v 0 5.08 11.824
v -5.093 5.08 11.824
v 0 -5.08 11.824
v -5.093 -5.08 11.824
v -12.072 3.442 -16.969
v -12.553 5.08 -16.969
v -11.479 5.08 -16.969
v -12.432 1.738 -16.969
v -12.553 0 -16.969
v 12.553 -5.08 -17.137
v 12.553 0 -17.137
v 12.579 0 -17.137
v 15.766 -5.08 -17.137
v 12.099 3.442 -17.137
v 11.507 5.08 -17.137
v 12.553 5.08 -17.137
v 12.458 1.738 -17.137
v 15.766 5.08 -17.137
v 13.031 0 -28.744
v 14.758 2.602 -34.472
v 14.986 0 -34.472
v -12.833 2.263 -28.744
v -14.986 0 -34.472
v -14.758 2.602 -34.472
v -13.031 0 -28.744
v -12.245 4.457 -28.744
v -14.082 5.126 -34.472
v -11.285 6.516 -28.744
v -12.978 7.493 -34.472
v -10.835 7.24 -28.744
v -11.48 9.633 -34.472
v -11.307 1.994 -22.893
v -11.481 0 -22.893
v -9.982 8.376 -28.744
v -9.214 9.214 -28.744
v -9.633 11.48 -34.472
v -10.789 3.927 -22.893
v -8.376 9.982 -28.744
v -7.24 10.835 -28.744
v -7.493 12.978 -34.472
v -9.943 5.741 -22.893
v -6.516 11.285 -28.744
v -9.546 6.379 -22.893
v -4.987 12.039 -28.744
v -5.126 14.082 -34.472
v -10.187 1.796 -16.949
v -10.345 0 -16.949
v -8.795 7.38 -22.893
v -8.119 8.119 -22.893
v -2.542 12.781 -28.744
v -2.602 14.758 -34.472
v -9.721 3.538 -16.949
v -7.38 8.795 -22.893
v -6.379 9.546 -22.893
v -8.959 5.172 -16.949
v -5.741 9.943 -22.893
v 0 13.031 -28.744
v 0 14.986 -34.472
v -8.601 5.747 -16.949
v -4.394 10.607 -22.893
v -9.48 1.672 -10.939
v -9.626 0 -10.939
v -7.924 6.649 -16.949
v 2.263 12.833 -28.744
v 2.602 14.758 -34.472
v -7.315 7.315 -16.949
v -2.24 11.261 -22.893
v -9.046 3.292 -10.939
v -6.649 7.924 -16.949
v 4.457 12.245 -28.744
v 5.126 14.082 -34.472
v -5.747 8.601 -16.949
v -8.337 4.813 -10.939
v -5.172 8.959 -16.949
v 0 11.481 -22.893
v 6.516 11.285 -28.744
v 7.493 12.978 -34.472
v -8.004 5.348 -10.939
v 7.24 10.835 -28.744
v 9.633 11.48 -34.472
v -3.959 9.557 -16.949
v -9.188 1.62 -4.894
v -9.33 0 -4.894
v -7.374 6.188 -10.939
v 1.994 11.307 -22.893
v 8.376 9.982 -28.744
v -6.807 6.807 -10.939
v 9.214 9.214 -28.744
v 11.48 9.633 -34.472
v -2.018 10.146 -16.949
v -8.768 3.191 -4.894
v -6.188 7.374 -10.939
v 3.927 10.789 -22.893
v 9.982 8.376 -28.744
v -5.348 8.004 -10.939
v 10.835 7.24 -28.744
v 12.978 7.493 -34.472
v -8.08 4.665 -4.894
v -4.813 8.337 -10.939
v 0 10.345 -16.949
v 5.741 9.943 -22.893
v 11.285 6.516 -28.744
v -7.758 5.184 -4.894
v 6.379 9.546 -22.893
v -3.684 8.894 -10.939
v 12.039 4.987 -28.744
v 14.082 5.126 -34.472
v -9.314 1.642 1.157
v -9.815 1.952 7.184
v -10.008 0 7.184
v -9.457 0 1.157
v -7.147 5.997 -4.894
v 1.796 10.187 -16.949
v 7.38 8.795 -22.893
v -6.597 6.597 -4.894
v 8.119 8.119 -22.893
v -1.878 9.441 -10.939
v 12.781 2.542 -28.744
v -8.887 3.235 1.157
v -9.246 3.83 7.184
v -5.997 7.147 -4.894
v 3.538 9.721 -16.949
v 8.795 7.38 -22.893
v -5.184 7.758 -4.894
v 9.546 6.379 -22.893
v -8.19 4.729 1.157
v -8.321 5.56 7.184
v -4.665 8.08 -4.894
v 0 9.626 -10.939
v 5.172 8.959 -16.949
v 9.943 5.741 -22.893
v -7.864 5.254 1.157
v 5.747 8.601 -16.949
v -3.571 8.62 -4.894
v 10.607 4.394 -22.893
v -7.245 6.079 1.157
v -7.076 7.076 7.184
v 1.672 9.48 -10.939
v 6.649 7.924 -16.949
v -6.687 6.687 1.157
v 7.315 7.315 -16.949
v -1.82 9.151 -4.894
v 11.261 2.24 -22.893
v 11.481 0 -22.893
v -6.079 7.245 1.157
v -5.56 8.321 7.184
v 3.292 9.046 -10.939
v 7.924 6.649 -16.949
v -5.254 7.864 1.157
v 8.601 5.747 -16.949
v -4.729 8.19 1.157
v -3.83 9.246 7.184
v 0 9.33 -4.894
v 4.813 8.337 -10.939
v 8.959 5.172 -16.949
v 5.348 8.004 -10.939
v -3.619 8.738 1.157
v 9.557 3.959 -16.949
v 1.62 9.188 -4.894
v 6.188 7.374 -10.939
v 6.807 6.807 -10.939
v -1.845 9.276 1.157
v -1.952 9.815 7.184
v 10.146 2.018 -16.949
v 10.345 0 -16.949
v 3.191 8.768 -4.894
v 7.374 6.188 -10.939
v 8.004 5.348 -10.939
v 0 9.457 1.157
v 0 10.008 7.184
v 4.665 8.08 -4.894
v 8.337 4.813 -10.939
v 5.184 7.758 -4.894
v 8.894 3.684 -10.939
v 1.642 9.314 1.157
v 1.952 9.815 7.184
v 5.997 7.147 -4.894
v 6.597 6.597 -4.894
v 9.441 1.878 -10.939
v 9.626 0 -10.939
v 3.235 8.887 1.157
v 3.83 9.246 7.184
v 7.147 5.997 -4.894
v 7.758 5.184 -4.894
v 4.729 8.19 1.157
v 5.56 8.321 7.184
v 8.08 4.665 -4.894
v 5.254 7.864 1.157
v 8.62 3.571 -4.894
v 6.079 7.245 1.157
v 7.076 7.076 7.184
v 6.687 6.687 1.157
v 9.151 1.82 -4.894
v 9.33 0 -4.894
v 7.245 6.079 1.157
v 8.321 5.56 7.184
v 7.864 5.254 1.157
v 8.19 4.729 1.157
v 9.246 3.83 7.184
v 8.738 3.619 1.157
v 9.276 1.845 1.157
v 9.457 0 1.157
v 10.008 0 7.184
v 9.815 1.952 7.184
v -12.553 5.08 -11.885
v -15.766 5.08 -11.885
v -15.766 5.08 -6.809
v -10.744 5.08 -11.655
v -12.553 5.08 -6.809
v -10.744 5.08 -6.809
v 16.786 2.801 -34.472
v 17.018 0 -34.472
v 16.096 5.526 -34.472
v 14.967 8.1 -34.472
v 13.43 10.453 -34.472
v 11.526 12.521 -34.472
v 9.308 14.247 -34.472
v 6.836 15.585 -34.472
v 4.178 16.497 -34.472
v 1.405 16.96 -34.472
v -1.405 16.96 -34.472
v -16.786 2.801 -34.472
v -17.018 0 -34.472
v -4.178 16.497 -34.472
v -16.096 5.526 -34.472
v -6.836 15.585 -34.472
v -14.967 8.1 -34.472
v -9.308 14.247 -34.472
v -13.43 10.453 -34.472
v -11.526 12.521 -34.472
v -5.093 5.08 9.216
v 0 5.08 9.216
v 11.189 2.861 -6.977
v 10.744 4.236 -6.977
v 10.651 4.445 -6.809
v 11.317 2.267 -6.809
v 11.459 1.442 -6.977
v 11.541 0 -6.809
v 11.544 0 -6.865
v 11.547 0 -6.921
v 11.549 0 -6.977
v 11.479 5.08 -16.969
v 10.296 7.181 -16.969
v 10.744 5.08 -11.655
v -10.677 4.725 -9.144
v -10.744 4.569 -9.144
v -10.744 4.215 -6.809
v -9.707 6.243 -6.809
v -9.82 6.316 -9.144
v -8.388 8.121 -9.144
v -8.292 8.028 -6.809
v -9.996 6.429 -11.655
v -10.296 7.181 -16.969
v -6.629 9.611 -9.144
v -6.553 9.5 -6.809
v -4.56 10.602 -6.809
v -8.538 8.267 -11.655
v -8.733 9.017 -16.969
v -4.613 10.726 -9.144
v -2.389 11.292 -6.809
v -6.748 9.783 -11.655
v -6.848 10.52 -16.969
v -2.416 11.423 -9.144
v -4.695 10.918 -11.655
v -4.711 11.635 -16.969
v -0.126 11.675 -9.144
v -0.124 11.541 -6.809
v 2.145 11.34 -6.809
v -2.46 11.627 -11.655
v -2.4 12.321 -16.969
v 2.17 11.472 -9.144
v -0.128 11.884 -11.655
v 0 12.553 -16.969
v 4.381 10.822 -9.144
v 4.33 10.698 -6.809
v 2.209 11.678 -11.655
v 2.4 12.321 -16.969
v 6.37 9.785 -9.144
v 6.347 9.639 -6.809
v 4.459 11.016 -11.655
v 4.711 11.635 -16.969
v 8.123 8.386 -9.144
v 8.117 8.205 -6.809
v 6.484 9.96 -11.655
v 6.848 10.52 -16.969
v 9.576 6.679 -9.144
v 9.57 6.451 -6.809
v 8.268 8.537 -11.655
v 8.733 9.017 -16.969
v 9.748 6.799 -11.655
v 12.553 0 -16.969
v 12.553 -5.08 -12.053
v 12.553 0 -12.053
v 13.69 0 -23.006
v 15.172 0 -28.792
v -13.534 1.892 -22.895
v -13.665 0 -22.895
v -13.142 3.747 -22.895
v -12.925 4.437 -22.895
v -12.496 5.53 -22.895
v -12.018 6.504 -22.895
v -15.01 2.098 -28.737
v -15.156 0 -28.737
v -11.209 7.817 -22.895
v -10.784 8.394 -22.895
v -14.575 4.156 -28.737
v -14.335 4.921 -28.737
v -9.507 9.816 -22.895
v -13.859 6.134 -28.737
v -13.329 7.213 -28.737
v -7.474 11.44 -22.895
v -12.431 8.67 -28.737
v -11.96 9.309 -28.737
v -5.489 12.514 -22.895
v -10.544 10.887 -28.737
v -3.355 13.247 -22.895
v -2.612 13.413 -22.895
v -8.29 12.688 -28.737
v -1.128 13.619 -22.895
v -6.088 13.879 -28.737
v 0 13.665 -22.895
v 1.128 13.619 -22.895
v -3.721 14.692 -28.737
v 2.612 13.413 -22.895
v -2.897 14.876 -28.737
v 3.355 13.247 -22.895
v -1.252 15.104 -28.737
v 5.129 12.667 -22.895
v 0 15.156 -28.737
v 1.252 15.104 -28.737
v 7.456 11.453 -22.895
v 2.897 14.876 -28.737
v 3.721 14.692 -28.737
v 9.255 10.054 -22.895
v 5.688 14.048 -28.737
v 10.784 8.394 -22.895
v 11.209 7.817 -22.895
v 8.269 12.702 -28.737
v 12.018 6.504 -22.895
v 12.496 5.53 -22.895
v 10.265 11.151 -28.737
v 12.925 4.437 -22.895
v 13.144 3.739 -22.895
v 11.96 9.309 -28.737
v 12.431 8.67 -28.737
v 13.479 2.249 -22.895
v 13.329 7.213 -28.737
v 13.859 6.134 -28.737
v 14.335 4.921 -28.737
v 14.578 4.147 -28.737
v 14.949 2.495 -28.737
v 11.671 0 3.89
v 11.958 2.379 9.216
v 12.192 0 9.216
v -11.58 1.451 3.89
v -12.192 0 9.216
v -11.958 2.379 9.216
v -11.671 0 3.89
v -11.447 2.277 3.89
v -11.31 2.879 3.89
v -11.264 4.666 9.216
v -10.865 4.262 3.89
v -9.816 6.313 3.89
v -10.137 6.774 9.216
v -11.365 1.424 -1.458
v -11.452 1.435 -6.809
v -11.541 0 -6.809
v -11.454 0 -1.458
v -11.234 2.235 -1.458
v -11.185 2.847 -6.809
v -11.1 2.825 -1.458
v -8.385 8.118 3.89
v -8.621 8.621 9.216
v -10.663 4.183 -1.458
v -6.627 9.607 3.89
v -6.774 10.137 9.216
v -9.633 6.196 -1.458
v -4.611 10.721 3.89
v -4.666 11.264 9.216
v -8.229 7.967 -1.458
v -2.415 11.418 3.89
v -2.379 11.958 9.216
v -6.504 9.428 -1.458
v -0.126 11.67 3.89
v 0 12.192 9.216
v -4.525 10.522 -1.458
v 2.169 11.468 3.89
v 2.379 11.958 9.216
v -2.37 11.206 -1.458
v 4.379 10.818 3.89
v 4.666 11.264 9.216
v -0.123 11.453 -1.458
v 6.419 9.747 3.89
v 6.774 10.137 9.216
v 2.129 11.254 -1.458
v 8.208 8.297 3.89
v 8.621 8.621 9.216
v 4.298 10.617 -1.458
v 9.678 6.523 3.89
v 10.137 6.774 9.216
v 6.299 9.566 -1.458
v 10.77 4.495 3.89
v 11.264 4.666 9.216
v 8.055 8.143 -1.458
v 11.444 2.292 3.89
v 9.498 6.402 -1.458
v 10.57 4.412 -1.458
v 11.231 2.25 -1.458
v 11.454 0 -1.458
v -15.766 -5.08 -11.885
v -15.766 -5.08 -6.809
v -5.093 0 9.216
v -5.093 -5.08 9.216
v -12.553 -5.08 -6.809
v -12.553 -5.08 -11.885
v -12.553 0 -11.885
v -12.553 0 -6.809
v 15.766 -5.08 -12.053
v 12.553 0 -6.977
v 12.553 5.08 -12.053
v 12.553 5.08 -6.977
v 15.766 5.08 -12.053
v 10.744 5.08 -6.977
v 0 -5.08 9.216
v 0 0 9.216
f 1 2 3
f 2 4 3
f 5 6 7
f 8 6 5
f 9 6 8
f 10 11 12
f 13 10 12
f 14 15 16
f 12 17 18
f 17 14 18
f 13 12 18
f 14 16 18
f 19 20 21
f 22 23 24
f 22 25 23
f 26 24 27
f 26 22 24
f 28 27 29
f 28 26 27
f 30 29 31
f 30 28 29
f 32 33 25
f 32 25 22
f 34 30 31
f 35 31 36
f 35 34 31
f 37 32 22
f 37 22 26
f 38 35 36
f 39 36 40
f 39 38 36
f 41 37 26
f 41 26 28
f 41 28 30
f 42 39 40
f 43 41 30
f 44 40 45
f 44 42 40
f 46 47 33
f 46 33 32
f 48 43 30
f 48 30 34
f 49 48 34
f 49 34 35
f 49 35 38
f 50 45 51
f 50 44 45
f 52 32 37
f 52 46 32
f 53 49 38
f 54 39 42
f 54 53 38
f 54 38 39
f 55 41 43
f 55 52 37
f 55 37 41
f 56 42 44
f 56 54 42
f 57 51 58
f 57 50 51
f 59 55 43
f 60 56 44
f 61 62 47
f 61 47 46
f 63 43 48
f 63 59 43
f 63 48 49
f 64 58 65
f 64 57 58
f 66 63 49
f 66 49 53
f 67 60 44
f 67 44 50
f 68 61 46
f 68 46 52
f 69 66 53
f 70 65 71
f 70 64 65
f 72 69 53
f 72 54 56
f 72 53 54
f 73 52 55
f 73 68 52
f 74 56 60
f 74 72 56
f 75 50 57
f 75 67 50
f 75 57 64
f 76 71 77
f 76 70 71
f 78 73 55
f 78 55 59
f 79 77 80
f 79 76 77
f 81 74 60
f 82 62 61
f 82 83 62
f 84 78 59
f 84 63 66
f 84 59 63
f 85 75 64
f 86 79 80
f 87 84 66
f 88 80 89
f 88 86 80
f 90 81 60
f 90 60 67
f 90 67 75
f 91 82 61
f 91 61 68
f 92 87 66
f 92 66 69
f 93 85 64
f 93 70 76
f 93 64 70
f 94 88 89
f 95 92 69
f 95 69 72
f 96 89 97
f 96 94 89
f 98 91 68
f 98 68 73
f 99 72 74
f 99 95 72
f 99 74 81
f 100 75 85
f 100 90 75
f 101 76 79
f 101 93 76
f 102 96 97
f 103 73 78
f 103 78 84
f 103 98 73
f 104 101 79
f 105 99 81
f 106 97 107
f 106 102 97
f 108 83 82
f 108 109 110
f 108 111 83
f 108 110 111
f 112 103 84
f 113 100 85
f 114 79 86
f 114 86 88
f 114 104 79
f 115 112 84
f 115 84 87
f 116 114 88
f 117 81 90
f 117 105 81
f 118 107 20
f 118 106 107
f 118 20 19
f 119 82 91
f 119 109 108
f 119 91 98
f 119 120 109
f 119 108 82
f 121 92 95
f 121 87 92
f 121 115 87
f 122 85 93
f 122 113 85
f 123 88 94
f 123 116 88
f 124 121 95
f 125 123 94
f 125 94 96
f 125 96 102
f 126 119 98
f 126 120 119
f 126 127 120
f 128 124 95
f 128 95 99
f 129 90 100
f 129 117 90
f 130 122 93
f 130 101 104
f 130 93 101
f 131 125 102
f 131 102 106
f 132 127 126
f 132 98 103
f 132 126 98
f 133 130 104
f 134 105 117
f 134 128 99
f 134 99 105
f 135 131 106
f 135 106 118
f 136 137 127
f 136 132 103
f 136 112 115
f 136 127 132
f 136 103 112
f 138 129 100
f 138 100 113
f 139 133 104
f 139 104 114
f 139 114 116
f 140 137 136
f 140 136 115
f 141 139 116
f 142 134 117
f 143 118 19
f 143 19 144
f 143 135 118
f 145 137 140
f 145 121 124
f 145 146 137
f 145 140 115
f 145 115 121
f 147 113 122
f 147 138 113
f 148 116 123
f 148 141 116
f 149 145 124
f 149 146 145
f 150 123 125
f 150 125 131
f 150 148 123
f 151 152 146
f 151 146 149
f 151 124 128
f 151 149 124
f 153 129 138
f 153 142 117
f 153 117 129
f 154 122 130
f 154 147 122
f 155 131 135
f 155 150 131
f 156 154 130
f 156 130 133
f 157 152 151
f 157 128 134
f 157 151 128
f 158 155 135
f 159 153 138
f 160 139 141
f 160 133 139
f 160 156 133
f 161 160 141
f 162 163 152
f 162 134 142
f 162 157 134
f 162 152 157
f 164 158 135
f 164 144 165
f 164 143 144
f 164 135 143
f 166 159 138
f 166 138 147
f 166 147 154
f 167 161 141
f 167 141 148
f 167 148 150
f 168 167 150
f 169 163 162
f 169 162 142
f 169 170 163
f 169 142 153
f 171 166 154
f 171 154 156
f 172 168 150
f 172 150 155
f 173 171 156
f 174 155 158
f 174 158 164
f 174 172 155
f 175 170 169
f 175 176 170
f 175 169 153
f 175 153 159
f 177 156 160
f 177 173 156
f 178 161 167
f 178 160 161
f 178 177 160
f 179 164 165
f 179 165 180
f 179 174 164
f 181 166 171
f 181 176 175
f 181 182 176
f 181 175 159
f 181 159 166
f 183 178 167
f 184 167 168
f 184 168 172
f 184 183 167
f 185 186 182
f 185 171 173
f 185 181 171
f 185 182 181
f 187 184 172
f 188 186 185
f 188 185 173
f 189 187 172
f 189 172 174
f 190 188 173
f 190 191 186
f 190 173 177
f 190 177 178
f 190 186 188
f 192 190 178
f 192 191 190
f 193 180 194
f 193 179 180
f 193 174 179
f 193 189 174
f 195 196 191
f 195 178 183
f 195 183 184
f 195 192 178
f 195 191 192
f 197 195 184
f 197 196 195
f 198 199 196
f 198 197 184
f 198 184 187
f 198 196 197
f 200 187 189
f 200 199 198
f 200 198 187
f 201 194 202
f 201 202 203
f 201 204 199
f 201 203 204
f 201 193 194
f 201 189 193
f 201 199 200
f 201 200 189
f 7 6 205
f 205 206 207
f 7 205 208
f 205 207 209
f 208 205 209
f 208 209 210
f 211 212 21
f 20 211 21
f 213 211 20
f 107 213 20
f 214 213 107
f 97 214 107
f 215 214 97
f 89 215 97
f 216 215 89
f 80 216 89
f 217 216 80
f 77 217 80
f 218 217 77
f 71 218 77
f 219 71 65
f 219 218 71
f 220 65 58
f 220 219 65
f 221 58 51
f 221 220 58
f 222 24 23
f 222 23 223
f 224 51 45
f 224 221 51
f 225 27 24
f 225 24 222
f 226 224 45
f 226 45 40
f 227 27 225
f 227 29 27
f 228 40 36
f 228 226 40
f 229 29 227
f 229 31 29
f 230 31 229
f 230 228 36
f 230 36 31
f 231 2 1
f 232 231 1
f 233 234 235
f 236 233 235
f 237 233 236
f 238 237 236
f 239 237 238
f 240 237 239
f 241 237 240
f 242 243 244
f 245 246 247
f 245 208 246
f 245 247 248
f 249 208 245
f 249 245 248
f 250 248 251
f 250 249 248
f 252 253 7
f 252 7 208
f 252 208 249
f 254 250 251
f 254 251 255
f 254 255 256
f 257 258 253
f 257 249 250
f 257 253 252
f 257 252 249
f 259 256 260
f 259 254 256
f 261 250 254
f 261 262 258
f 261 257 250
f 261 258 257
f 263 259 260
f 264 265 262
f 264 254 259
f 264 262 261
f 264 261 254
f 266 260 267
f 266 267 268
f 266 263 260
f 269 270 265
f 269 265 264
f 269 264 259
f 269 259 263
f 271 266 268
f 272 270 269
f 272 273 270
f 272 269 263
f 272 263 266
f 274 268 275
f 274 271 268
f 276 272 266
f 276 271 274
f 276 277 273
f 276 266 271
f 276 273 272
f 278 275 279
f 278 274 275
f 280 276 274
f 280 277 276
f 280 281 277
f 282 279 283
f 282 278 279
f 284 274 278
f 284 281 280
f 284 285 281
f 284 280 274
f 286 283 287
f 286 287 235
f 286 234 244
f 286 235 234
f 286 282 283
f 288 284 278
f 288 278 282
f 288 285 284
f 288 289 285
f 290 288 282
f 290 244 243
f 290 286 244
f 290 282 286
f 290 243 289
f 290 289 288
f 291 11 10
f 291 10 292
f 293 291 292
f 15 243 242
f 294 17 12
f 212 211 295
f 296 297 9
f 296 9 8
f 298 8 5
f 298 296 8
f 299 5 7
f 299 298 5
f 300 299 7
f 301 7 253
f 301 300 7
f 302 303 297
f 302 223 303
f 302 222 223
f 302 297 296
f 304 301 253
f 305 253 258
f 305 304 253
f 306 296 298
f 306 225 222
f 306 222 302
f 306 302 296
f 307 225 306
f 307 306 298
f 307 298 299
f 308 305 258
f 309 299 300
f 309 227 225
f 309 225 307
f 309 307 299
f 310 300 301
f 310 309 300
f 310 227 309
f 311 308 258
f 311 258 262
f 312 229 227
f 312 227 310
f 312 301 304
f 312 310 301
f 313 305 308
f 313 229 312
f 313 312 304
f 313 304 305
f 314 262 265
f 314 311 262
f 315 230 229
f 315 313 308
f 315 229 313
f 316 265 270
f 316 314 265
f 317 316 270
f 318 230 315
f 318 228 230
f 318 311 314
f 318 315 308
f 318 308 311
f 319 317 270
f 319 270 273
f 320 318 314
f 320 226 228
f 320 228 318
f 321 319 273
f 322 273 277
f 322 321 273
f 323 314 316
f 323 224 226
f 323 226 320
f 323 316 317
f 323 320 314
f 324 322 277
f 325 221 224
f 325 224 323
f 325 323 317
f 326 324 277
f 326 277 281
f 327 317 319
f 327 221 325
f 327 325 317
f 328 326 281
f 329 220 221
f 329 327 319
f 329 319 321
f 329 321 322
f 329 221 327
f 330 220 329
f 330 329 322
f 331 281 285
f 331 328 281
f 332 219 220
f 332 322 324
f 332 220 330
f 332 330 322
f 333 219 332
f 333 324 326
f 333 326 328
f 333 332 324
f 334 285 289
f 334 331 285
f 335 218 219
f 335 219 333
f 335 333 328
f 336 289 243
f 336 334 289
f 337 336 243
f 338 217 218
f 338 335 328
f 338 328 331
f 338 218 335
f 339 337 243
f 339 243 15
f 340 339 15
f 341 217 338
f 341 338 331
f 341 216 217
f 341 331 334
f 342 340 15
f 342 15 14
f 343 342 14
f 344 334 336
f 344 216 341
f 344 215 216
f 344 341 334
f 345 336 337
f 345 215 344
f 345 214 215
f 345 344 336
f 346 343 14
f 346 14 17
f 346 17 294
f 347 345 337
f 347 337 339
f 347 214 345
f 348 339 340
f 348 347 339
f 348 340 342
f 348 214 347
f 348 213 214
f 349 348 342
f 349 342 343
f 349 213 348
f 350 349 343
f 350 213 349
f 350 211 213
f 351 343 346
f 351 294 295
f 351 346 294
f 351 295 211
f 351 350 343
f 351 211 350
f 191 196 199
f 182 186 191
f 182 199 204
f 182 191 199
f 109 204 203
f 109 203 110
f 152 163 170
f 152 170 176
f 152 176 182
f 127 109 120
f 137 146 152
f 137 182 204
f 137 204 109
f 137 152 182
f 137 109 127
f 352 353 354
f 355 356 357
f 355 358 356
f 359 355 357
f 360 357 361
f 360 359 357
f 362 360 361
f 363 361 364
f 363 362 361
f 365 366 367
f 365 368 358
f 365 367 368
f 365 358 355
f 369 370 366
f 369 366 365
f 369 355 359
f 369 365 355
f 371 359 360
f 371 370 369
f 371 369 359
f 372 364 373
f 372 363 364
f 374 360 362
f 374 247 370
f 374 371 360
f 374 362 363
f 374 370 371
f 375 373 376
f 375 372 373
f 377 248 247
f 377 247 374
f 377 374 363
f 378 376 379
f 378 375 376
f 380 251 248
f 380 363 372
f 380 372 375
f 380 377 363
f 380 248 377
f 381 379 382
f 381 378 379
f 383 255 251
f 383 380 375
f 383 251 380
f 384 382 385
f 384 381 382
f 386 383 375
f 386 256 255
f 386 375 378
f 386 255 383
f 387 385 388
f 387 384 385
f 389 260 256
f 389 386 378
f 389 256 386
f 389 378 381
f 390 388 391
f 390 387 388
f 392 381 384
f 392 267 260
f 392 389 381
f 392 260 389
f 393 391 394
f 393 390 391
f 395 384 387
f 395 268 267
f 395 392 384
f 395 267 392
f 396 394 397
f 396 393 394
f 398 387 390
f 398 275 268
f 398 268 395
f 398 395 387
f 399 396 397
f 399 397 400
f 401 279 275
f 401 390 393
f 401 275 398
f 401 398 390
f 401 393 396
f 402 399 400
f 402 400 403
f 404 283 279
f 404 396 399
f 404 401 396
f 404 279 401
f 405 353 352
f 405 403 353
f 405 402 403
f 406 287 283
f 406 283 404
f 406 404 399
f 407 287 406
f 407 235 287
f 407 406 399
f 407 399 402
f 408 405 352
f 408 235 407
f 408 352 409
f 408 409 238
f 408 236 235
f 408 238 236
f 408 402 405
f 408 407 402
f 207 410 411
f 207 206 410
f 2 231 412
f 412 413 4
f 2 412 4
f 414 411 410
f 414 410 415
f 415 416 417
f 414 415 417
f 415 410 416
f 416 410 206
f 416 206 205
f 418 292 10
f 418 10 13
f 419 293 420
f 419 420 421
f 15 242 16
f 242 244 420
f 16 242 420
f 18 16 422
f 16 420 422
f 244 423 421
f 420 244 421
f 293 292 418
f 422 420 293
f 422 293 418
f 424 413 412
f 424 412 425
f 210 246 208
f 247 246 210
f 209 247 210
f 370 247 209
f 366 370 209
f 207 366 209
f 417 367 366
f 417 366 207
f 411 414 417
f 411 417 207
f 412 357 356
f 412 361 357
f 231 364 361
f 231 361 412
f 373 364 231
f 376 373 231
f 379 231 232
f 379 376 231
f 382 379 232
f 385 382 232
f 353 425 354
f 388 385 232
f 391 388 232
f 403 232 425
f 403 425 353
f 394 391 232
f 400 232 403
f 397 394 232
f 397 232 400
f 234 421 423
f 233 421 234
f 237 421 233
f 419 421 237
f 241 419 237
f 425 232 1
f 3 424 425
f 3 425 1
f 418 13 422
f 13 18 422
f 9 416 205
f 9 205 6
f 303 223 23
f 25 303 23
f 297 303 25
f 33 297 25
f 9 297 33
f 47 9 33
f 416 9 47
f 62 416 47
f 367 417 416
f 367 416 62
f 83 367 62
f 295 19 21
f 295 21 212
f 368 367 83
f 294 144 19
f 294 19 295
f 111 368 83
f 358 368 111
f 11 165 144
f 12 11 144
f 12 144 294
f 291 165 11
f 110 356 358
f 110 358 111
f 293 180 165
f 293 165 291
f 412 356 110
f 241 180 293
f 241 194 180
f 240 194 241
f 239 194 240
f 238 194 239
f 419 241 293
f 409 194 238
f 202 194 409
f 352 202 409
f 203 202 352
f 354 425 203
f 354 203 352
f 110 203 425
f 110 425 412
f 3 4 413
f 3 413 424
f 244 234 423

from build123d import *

# Parameters (mm, degrees)
F1_ANGLE = 180
F2_DEPTH = 5.08
F0_W     = 3.2131851465
F0_H     = 5.0839147031
F0_H_2   = 5.0760852969
F0_W_2   = 5.092757754
F0_H_3   = 2.607280938
F3_DEPTH = 5.08


with BuildPart() as f1:
    # F0 (on Front) → F1 (revolve)
    with BuildSketch(Plane.XZ):
        with BuildLine():
            Line((0, 7.1843154948), (0, 9.2163154948))
            Line((0, 9.2163154948), (-5.092757754, 9.2163154948))
            Line((-5.092757754, 9.2163154948), (-12.192, 9.2163154948))
            ThreePointArc((-12.192, 9.2163154948), (-11.524233364, 1.2175235719), (-11.5414183138, -6.8090752834))
            Line((-11.5414183138, -6.8090752834), (-10.7442, -6.8090752834))
            Line((-10.7442, -6.8090752834), (-10.7442, -16.9690752834))
            Line((-10.7442, -16.9690752834), (-12.55264014, -16.9690752834))
            ThreePointArc((-12.55264014, -16.9690752834), (-14.3638496802, -25.8279076884), (-17.018, -34.4716845052))
            Line((-17.018, -34.4716845052), (-14.986, -34.4716845052))
            ThreePointArc((-14.986, -34.4716845052), (-9.9329646545, -13.9500940953), (-10.0076, 7.1843154948))
            Line((-10.0076, 7.1843154948), (0, 7.1843154948))
        make_face()
        with BuildLine():
            Line((-10.7442, -6.8090752834), (-11.5414183138, -6.8090752834))
            ThreePointArc((-11.5414183138, -6.8090752834), (-11.908955512, -11.9028177198), (-12.55264014, -16.9690752834))
            Line((-12.55264014, -16.9690752834), (-10.7442, -16.9690752834))
            Line((-10.7442, -16.9690752834), (-10.7442, -6.8090752834))
        make_face()
    revolve(axis=Axis((0, 0, 8.2003154948), (0, 0, -1)), revolution_arc=F1_ANGLE)

    # F0 (on Front) → F2 (join)
    with BuildSketch(Plane.XZ):
        with BuildLine():
            ThreePointArc((-12.55264014, -16.9690752834), (-11.908955512, -11.9028177198), (-11.5414183138, -6.8090752834))
            Line((-11.5414183138, -6.8090752834), (-12.55264014, -6.8090752834))
            Line((-12.55264014, -6.8090752834), (-12.55264014, -11.8851605803))
            Line((-12.55264014, -11.8851605803), (-12.55264014, -16.9690752834))
        make_face()
        with BuildLine():
            Line((-10.7442, -6.8090752834), (-11.5414183138, -6.8090752834))
            ThreePointArc((-11.5414183138, -6.8090752834), (-11.908955512, -11.9028177198), (-12.55264014, -16.9690752834))
            Line((-12.55264014, -16.9690752834), (-10.7442, -16.9690752834))
            Line((-10.7442, -16.9690752834), (-10.7442, -6.8090752834))
        make_face()
        Polygon((12.55264014, -6.9773710036), (10.7442, -6.9773710036), (10.7442, -17.1373710036), (12.55264014, -17.1373710036), (12.55264014, -12.0534563005), align=None)
    extrude(amount=-F2_DEPTH)

    # F0 (on Front) → F3 (join, symmetric)
    with BuildSketch(Plane.XZ):
        with Locations((14.1592327132, -14.5954136521)):
            Rectangle(F0_W, F0_H)
        with Locations((-14.1592327132, -9.3471179318)):
            Rectangle(F0_W, F0_H_2)
        with Locations((-2.546378877, 10.5199559638)):
            Rectangle(F0_W_2, F0_H_3)
    extrude(amount=F3_DEPTH, both=True)


solid = f1.part
